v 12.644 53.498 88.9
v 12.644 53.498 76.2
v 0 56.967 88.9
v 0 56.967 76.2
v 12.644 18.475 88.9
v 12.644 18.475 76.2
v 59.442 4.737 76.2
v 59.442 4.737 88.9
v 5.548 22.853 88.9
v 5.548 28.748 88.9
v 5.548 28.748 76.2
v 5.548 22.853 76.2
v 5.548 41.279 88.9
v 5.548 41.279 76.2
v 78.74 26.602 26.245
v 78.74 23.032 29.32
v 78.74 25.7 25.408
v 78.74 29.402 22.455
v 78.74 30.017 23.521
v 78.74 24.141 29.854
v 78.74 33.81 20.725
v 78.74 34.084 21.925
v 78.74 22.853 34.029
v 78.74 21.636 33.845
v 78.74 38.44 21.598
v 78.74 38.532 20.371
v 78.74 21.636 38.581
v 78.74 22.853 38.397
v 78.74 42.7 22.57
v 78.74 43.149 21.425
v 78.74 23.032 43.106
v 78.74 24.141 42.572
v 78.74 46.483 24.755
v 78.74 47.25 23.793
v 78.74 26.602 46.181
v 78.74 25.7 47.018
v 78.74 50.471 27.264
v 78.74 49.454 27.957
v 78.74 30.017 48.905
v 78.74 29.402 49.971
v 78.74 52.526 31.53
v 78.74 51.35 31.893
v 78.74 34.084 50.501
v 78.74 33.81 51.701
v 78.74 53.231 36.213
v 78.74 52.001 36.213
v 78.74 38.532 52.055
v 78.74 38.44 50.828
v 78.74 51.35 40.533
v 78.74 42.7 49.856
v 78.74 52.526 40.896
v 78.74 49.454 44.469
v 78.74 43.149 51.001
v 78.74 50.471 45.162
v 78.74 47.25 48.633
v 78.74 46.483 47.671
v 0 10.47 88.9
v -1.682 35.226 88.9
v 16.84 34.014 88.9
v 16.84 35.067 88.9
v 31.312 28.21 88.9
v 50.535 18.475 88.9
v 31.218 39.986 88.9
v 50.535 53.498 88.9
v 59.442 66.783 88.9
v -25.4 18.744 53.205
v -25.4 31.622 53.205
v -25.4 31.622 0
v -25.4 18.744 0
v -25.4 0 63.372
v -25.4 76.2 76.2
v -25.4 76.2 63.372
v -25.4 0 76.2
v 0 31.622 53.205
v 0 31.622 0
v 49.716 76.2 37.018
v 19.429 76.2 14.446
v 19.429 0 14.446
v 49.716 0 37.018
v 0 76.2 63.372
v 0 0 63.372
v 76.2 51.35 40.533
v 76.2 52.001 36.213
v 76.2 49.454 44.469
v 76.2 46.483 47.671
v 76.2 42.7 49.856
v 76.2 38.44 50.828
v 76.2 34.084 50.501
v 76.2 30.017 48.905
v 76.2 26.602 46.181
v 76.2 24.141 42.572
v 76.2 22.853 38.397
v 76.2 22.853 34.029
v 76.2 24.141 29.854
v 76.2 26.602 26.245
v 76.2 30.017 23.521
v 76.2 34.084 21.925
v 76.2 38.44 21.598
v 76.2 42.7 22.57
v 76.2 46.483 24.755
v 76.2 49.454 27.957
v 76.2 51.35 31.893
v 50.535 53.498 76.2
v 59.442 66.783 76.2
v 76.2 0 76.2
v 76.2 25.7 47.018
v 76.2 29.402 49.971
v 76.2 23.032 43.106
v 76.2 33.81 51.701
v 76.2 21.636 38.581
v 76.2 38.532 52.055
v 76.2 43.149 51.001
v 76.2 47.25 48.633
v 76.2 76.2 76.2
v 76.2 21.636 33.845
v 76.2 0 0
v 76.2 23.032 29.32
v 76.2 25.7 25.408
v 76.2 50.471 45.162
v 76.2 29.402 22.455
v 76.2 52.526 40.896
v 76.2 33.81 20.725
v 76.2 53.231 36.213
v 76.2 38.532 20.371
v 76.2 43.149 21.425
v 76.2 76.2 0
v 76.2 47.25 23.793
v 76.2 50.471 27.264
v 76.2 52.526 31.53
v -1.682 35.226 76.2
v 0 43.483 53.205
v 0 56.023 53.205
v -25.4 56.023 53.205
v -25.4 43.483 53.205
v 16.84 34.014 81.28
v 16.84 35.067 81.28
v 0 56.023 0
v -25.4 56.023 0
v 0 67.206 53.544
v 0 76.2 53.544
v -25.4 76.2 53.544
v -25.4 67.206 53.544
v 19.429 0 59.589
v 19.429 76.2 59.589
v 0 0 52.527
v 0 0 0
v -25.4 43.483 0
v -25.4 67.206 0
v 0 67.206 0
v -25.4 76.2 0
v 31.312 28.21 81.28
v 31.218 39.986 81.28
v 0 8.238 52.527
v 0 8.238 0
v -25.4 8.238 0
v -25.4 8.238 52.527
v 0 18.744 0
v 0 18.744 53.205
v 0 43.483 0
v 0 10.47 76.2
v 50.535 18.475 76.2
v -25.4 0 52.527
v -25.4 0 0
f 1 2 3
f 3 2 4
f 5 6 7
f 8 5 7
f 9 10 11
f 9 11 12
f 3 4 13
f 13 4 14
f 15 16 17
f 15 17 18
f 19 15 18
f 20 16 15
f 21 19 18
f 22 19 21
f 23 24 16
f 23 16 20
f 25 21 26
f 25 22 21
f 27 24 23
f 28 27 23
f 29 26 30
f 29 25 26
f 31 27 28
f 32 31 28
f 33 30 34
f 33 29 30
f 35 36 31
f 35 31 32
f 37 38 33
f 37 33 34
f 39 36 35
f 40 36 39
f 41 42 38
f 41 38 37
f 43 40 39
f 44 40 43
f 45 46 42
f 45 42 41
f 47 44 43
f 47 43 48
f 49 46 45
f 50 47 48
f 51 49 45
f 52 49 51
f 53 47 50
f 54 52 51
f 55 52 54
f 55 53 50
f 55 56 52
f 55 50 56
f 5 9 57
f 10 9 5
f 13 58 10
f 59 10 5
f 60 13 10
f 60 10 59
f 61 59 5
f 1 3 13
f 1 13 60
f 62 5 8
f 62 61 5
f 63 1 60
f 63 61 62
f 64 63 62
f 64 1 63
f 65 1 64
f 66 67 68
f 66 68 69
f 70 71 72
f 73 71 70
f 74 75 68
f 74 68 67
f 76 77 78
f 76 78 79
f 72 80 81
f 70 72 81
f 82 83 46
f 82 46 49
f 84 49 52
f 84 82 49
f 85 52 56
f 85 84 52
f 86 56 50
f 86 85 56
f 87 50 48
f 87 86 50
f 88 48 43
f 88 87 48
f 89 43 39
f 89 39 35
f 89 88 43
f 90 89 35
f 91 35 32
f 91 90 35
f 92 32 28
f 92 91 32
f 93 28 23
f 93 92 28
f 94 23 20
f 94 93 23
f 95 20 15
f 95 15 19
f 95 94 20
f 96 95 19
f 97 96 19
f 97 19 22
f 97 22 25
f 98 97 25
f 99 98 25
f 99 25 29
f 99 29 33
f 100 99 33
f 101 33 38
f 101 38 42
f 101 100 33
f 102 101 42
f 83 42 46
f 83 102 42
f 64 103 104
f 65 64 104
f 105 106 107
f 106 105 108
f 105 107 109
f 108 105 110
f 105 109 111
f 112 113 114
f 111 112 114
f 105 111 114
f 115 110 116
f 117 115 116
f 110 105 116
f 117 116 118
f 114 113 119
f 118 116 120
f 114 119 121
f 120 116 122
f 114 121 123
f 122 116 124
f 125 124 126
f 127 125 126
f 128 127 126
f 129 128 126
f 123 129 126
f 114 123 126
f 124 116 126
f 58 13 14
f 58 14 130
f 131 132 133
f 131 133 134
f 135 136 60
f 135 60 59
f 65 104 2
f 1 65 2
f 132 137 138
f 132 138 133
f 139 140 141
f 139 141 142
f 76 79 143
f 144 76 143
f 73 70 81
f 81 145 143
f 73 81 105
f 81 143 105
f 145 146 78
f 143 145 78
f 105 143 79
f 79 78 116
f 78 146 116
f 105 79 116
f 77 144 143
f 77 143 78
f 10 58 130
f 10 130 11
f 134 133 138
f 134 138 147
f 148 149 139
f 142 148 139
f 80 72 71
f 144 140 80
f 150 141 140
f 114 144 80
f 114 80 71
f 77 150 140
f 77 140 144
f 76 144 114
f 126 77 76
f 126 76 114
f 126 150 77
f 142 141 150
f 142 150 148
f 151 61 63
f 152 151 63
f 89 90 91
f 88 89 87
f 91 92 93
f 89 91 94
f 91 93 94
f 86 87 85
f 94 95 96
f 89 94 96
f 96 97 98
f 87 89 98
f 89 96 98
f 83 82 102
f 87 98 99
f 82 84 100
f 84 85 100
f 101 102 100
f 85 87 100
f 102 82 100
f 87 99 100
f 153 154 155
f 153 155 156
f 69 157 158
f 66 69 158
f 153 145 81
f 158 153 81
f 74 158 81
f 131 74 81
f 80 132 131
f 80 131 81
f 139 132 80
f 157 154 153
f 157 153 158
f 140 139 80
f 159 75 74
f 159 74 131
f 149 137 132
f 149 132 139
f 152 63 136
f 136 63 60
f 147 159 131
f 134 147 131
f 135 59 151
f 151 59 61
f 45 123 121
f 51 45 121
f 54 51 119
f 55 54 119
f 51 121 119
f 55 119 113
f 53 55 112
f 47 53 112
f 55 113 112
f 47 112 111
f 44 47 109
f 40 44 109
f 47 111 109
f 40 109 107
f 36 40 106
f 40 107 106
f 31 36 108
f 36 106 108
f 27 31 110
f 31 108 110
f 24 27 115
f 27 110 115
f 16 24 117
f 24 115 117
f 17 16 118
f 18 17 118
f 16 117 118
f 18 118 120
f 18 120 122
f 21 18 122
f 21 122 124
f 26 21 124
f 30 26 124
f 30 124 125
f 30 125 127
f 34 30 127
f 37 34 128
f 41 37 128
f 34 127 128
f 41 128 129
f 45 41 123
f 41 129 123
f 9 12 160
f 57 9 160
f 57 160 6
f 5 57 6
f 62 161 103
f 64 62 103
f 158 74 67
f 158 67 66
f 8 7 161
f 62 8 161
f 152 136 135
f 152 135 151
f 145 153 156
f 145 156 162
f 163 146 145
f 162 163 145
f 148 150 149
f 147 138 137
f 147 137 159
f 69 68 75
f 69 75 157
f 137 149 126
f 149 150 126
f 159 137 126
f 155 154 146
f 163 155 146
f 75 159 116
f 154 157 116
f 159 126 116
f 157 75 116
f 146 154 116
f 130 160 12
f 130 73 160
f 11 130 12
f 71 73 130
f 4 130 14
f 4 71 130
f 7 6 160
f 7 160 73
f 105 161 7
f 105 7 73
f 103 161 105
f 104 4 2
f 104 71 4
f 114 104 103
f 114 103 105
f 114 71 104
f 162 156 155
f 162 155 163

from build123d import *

# Parameters (mm, degrees)
F0_W      = 76.2
F0_H      = 76.2
F1_DEPTH  = 76.2
F2_W      = 12.539256
F2_H      = 53.205002
F2_W_2    = 12.878159
F2_W_3    = 8.237785
F2_H_2    = 52.527204
F2_W_4    = 8.993818
F2_H_3    = 53.543892
F2_W_5    = 76.2
F2_H_4    = 12.828036
F3_DEPTH  = 25.4
F5_DEPTH  = 254
F7_DEPTH  = 12.7
F9_DEPTH  = 7.62
F10_R     = 15.886225
F10_R_2   = 14.655787
F11_DEPTH = 2.54


with BuildPart() as f1:
    # F0 (on Top) → F1 (new body)
    with BuildSketch(Plane.XY):
        with Locations((38.1, 38.1)):
            Rectangle(F0_W, F0_H)
    extrude(amount=F1_DEPTH)

    # F2 (on face) → F3 (join)
    with BuildSketch(Plane(origin=(0, 0, 0), x_dir=(0, -1, 0), z_dir=(-1, 0, 0))):
        with Locations((-49.752893, 26.602501)):
            Rectangle(F2_W, F2_H)
        with Locations((-25.182727, 26.602501)):
            Rectangle(F2_W_2, F2_H)
        with Locations((-4.118892, 26.263602)):
            Rectangle(F2_W_3, F2_H_2)
        with Locations((-71.703091, 26.771946)):
            Rectangle(F2_W_4, F2_H_3)
        with Locations((-38.1, 69.785982)):
            Rectangle(F2_W_5, F2_H_4)
    extrude(amount=F3_DEPTH)

    # F4 (on face) → F5 (cut)
    with BuildSketch(Plane.XZ):
        Polygon((49.715646, 37.017897), (19.429348, 59.589423), (19.429348, 14.446371), align=None)
    extrude(amount=-F5_DEPTH, mode=Mode.SUBTRACT)

    # F6 (on face) → F7 (join)
    with BuildSketch(Plane.XY.offset(76.2)):
        Polygon((59.441991, 4.737339), (50.535221, 18.474905), (50.535221, 53.498153), (59.441991, 66.782832), (12.64369, 53.498153), (12.64369, 48.818324), (5.548463, 48.818324), (5.548463, 41.278802), (5.548463, 28.747914), (5.548463, 22.852812), (12.64369, 22.852812), (12.64369, 18.474905), align=None)
        Polygon((0, 10.469685), (12.64369, 18.474905), (12.64369, 22.852812), (5.548463, 22.852812), align=None)
        Polygon((12.64369, 48.818324), (12.64369, 53.498153), (0, 56.967318), (5.548463, 41.278802), (5.548463, 48.818324), align=None)
        Polygon((5.548463, 28.747914), (5.548463, 41.278802), (-1.681807, 35.226036), align=None)
    extrude(amount=F7_DEPTH)

    # F8 (on face) → F9 (cut)
    with BuildSketch(Plane.XY.offset(88.9)):
        Polygon((16.839748, 35.066836), (16.839748, 34.013547), (31.31187, 28.2102), (31.218205, 39.986227), align=None)
    extrude(amount=-F9_DEPTH, mode=Mode.SUBTRACT)

    # F10 (on face) → F11 (join)
    with BuildSketch(Plane.YZ.offset(76.2)):
        with Locations((37.34519, 36.212973)):
            Circle(F10_R)
        with Locations((37.34519, 36.212973)):
            Circle(F10_R_2, mode=Mode.SUBTRACT)
    extrude(amount=F11_DEPTH)


solid = f1.part
